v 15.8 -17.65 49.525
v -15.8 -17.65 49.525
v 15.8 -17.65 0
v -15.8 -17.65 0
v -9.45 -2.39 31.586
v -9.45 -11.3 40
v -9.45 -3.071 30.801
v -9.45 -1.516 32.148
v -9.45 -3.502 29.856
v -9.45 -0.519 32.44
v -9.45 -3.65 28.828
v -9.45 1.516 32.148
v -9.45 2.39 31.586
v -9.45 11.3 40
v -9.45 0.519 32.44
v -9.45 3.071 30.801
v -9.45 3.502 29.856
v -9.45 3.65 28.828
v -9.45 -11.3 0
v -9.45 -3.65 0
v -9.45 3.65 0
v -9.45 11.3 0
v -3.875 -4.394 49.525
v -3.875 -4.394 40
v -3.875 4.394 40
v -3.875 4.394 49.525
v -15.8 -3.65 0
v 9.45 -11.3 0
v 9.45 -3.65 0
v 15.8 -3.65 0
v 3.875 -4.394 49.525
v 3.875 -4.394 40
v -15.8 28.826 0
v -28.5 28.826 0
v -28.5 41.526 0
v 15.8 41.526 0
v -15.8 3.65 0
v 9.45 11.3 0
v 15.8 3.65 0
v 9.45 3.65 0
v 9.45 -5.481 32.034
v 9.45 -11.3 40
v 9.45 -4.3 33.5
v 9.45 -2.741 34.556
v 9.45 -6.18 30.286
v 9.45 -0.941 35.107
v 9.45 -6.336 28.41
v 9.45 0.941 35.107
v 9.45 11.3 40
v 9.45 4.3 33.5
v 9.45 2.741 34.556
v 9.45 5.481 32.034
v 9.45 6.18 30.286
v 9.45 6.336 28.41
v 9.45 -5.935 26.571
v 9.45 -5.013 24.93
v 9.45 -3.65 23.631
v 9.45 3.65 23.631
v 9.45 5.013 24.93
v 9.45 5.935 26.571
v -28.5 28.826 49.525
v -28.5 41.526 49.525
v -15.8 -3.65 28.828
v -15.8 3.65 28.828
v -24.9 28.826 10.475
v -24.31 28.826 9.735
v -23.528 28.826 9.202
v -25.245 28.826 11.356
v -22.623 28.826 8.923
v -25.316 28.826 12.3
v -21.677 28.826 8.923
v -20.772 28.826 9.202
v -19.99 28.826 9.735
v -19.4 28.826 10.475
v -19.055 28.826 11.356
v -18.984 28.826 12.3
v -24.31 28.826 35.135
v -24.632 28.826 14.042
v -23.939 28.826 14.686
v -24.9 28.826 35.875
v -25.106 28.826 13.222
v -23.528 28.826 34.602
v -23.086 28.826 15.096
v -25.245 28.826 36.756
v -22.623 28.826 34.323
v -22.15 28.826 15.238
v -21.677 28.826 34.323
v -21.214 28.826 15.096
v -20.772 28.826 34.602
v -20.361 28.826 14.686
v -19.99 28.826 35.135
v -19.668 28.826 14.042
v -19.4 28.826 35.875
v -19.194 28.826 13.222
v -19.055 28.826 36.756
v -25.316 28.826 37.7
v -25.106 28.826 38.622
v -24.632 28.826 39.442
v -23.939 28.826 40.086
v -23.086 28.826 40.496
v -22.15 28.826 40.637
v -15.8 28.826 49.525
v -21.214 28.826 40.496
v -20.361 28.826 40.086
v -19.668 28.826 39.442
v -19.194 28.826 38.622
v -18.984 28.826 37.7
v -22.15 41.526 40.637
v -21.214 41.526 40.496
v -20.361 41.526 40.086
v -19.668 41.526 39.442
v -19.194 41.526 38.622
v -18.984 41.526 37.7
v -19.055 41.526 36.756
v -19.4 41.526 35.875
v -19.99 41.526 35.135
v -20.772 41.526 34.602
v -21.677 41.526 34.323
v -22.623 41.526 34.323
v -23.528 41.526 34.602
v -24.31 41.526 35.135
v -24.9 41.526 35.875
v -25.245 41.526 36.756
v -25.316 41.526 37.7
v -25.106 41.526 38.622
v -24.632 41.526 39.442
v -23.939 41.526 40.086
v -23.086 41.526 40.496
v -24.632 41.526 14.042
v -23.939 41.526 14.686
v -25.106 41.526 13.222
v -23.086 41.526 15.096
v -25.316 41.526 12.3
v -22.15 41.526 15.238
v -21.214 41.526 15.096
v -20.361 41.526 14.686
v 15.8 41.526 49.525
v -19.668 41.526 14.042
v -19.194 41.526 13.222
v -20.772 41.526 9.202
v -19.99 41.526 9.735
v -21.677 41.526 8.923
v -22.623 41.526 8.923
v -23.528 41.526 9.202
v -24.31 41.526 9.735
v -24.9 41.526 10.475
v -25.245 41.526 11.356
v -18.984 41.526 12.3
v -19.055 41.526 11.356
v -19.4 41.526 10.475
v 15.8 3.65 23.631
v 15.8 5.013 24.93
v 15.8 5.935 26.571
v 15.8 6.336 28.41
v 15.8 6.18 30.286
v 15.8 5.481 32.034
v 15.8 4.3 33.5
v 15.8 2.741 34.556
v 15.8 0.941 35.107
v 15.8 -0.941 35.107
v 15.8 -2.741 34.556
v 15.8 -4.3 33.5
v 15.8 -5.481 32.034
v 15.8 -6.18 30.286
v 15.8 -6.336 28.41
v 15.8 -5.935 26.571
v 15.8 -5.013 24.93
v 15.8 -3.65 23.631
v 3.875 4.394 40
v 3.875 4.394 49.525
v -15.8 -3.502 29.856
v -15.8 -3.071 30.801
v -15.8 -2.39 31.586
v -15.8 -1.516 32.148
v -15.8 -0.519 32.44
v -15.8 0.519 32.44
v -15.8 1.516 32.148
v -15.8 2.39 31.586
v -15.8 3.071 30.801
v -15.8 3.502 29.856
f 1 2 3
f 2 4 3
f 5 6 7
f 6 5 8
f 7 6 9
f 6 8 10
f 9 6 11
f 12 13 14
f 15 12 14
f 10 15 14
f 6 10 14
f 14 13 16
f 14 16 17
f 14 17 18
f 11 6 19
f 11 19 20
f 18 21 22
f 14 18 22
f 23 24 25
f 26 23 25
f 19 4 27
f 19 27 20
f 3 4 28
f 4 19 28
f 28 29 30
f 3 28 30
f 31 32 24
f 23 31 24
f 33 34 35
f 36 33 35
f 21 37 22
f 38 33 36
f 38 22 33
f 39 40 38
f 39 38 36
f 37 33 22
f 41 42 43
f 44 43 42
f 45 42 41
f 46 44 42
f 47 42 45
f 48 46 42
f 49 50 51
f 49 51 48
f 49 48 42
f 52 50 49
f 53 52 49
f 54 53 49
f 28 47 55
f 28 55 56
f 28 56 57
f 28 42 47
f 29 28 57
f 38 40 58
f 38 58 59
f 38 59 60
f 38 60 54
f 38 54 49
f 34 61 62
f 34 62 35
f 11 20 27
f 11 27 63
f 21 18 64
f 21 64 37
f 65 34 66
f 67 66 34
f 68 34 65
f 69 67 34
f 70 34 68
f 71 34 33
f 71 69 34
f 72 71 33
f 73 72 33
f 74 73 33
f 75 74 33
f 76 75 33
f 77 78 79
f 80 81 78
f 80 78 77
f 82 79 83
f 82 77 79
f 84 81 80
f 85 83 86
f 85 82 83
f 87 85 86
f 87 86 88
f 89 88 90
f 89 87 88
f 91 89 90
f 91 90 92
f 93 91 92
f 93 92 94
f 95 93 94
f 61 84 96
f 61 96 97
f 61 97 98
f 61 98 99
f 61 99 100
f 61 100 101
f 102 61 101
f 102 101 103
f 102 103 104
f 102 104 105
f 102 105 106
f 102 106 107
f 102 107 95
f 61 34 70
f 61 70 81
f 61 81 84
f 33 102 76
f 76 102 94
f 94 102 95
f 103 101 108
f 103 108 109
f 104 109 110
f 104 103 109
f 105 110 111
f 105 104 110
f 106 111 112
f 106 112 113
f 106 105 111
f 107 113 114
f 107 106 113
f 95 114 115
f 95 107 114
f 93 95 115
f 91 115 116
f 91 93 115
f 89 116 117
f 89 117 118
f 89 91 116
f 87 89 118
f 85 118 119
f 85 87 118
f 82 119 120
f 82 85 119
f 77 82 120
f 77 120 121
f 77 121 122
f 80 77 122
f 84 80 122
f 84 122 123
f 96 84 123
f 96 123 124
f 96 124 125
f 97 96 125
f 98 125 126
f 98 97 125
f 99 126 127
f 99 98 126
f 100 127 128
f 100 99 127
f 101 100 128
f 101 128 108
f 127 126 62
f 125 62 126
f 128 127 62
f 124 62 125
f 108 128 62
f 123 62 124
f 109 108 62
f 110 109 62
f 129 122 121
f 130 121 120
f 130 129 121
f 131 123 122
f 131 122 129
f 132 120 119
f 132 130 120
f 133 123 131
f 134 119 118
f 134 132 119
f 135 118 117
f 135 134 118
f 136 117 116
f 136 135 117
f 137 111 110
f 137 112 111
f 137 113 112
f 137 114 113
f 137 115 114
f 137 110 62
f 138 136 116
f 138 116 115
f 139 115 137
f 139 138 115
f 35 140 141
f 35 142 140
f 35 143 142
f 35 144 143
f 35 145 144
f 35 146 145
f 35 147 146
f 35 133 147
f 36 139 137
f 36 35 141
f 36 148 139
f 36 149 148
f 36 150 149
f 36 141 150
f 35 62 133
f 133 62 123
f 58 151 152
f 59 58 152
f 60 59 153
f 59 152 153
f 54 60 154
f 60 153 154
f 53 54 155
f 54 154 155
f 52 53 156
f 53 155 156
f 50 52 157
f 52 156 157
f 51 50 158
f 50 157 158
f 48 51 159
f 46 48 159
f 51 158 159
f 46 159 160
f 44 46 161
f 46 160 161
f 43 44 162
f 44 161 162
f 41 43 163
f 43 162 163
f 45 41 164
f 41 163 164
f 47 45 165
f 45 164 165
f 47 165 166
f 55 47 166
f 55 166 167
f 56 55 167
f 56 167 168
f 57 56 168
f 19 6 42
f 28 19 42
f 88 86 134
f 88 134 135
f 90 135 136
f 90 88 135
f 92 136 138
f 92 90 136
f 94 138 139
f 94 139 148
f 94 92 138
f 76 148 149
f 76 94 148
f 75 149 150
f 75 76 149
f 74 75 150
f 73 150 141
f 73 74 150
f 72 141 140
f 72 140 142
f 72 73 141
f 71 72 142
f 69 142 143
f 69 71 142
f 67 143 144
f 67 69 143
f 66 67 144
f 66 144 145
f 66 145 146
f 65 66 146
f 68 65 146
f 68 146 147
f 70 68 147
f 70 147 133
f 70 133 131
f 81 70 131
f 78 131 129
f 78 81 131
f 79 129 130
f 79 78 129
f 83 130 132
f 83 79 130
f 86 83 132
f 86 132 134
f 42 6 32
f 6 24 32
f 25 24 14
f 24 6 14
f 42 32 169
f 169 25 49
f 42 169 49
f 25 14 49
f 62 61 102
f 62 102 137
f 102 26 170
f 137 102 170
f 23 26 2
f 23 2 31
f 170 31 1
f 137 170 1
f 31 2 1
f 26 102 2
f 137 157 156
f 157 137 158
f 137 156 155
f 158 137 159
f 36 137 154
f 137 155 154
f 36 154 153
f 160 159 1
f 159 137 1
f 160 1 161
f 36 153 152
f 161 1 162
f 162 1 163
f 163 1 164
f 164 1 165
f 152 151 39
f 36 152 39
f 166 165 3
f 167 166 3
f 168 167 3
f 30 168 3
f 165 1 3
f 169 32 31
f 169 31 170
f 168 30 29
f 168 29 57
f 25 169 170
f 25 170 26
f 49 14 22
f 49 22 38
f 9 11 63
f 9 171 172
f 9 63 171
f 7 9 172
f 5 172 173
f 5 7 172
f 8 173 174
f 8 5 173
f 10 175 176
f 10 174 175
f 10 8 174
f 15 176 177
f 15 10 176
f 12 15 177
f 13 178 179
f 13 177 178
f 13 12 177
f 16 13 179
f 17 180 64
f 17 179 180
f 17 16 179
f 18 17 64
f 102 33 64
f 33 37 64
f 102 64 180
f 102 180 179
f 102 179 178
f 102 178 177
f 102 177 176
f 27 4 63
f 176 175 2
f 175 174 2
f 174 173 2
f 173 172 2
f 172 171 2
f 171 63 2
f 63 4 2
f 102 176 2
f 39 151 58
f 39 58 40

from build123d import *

# Parameters (mm, degrees)
SKETCH1_W           = 31.6
SKETCH1_H           = 35.300000012
SKETCH1_W_2         = 18.9
SKETCH1_H_2         = 22.600000012
BOSS_EXTRUDE1_DEPTH = 40
SKETCH2_W           = 31.6
SKETCH2_H           = 35.300000012
SKETCH2_W_2         = 18.9
SKETCH2_H_2         = 22.600000012
BOSS_EXTRUDE2_DEPTH = 9.525
SKETCH3_W           = 7.74908697
SKETCH3_H           = 8.788598638
CUT_EXTRUDE1_DEPTH  = 12.7
CUT_EXTRUDE2_DEPTH  = 31.75
SKETCH6_W           = 31.6
SKETCH6_H           = 49.525
BOSS_EXTRUDE3_DEPTH = 11.176
BOSS_EXTRUDE4_START = -44.45
SKETCH7_W           = 49.525
SKETCH7_H           = 6.35
BOSS_EXTRUDE4_DEPTH = 57.15
SKETCH8_R           = 3.175
CUT_EXTRUDE3_DEPTH  = 6.35
SKETCH9_W           = 12.85
SKETCH9_H           = 49.525
CUT_EXTRUDE4_DEPTH  = 6.35
SKETCH11_R          = 3.429
SKETCH11_W          = 12.85
SKETCH11_H          = 49.525
CUT_EXTRUDE5_DEPTH  = 6.35
SKETCH12_R          = 6.35
CUT_EXTRUDE6_DEPTH  = 6.35
SKETCH13_W          = 44.3
SKETCH13_H          = 49.525
SKETCH13_R          = 3.175
BOSS_EXTRUDE5_DEPTH = 12.7
SKETCH14_W          = 12.7
SKETCH14_H          = 49.525
SKETCH14_R          = 3.175
CUT_EXTRUDE7_DEPTH  = 6.35


with BuildPart() as part:
    # Sketch1 → Boss-Extrude1 (new body)
    with BuildSketch(Plane.XY):
        Rectangle(SKETCH1_W, SKETCH1_H)
        Rectangle(SKETCH1_W_2, SKETCH1_H_2, mode=Mode.SUBTRACT)
    extrude(amount=BOSS_EXTRUDE1_DEPTH)

    # Sketch2 → Boss-Extrude2 (add)
    # profile 1 of 2: a face of its own
    with BuildSketch(Plane.XY.offset(40)):
        Rectangle(SKETCH2_W, SKETCH2_H)
        Rectangle(SKETCH2_W_2, SKETCH2_H_2, mode=Mode.SUBTRACT)
    # profile 2 of 2: a face of its own
    with BuildSketch(Plane.XY.offset(40)):
        Rectangle(SKETCH2_W_2, SKETCH2_H_2)
    extrude(amount=BOSS_EXTRUDE2_DEPTH)

    # Sketch3 → Cut-Extrude1 (cut)
    with BuildSketch(Plane(origin=(0, 0, 40), x_dir=(-1, 0, 0), z_dir=(0, 0, -1))):
        Rectangle(SKETCH3_W, SKETCH3_H)
    extrude(amount=-CUT_EXTRUDE1_DEPTH, mode=Mode.SUBTRACT)

    # Sketch5 → Cut-Extrude2 (cut)
    with BuildSketch(Plane(origin=(15.8, 0, 0), x_dir=(0, 0, -1), z_dir=(1, 0, 0))):
        with BuildLine():
            Line((-28.827575985, 3.65), (0, 3.65))
            Line((0, 3.65), (0, -3.65))
            Line((0, -3.65), (-28.827575985, -3.65))
            ThreePointArc((-28.827575985, -3.65), (-32.477575985, 0), (-28.827575985, 3.65))
        make_face()
    extrude(amount=-CUT_EXTRUDE2_DEPTH, mode=Mode.SUBTRACT)

    # Sketch6 → Boss-Extrude3 (add)
    with BuildSketch(Plane(origin=(0, 17.650000006, 0), x_dir=(1, 0, 0), z_dir=(0, 1, 0))):
        with Locations((0, -24.7625)):
            Rectangle(SKETCH6_W, SKETCH6_H)
    extrude(amount=BOSS_EXTRUDE3_DEPTH)

    # Sketch7 → Boss-Extrude4 (add)
    with BuildSketch(Plane(origin=(15.8, 0, 0), x_dir=(0, 0, -1), z_dir=(1, 0, 0)).offset(BOSS_EXTRUDE4_START)):
        with Locations((-24.7625, 25.651000006)):
            Rectangle(SKETCH7_W, SKETCH7_H)
    boss_extrude4 = extrude(amount=BOSS_EXTRUDE4_DEPTH)

    # Sketch8 → Cut-Extrude3 (cut)
    with BuildSketch(Plane.XZ.offset(-22.476000006)):
        with Locations(Location((-22.225, 24.7625, 0), (0, 0, 270))):
            Circle(SKETCH8_R)
        with Locations(Location((22.15, 37.434572452, 0), (0, 0, 270))):
            Circle(SKETCH8_R)
        with Locations(Location((22.15, 12.034572452, 0), (0, 0, 270))):
            Circle(SKETCH8_R)
    extrude(amount=-CUT_EXTRUDE3_DEPTH, mode=Mode.SUBTRACT)

    # Sketch9 → Cut-Extrude4 (cut)
    with BuildSketch(Plane.XZ.offset(-22.476000006)):
        with Locations((-22.225, 24.7625)):
            Rectangle(SKETCH9_W, SKETCH9_H)
    extrude(amount=-CUT_EXTRUDE4_DEPTH, mode=Mode.SUBTRACT)

    # Mirror1: Boss-Extrude4 across plane
    add(boss_extrude4.mirror(Plane(origin=(0, 0, 0), x_dir=(0, 0, 1), z_dir=(1, 0, 0))))

    # Sketch11 → Cut-Extrude5 (cut)
    with BuildSketch(Plane(origin=(0, 28.826000006, 0), x_dir=(1, 0, 0), z_dir=(0, 1, 0))):
        with Locations(Location((-22.15, -37.4625, 0), (0, 0, 270))):
            Circle(SKETCH11_R)
        with Locations(Location((-22.15, -12.0625, 0), (0, 0, 270))):
            Circle(SKETCH11_R)
        with Locations((22.225, -24.7625)):
            Rectangle(SKETCH11_W, SKETCH11_H)
    extrude(amount=-CUT_EXTRUDE5_DEPTH, mode=Mode.SUBTRACT)

    # Sketch12 → Cut-Extrude6 (cut)
    with BuildSketch(Plane(origin=(15.8, 0, 0), x_dir=(0, 0, -1), z_dir=(1, 0, 0))):
        with Locations((-28.827575985, 0)):
            Circle(SKETCH12_R)
    extrude(amount=-CUT_EXTRUDE6_DEPTH, mode=Mode.SUBTRACT)

    # Sketch13 → Boss-Extrude5 (add)
    with BuildSketch(Plane(origin=(0, 28.826000006, 0), x_dir=(1, 0, 0), z_dir=(0, 1, 0))):
        with Locations((-6.35, -24.7625)):
            Rectangle(SKETCH13_W, SKETCH13_H)
        with Locations(Location((-22.15, -12.0625, 0), (0, 0, 270))):
            Circle(SKETCH13_R, mode=Mode.SUBTRACT)
        with Locations(Location((-22.15, -37.4625, 0), (0, 0, 270))):
            Circle(SKETCH13_R, mode=Mode.SUBTRACT)
    extrude(amount=BOSS_EXTRUDE5_DEPTH)

    # Sketch14 → Cut-Extrude7 (cut)
    with BuildSketch(Plane.XZ.offset(-22.476000006)):
        with Locations((-22.15, 24.7625)):
            Rectangle(SKETCH14_W, SKETCH14_H)
        with Locations(Location((-22.15, 37.4625, 0), (0, 0, 90))):
            Circle(SKETCH14_R, mode=Mode.SUBTRACT)
        with Locations(Location((-22.15, 12.0625, 0), (0, 0, 90))):
            Circle(SKETCH14_R, mode=Mode.SUBTRACT)
    extrude(amount=-CUT_EXTRUDE7_DEPTH, mode=Mode.SUBTRACT)


solid = part.part
